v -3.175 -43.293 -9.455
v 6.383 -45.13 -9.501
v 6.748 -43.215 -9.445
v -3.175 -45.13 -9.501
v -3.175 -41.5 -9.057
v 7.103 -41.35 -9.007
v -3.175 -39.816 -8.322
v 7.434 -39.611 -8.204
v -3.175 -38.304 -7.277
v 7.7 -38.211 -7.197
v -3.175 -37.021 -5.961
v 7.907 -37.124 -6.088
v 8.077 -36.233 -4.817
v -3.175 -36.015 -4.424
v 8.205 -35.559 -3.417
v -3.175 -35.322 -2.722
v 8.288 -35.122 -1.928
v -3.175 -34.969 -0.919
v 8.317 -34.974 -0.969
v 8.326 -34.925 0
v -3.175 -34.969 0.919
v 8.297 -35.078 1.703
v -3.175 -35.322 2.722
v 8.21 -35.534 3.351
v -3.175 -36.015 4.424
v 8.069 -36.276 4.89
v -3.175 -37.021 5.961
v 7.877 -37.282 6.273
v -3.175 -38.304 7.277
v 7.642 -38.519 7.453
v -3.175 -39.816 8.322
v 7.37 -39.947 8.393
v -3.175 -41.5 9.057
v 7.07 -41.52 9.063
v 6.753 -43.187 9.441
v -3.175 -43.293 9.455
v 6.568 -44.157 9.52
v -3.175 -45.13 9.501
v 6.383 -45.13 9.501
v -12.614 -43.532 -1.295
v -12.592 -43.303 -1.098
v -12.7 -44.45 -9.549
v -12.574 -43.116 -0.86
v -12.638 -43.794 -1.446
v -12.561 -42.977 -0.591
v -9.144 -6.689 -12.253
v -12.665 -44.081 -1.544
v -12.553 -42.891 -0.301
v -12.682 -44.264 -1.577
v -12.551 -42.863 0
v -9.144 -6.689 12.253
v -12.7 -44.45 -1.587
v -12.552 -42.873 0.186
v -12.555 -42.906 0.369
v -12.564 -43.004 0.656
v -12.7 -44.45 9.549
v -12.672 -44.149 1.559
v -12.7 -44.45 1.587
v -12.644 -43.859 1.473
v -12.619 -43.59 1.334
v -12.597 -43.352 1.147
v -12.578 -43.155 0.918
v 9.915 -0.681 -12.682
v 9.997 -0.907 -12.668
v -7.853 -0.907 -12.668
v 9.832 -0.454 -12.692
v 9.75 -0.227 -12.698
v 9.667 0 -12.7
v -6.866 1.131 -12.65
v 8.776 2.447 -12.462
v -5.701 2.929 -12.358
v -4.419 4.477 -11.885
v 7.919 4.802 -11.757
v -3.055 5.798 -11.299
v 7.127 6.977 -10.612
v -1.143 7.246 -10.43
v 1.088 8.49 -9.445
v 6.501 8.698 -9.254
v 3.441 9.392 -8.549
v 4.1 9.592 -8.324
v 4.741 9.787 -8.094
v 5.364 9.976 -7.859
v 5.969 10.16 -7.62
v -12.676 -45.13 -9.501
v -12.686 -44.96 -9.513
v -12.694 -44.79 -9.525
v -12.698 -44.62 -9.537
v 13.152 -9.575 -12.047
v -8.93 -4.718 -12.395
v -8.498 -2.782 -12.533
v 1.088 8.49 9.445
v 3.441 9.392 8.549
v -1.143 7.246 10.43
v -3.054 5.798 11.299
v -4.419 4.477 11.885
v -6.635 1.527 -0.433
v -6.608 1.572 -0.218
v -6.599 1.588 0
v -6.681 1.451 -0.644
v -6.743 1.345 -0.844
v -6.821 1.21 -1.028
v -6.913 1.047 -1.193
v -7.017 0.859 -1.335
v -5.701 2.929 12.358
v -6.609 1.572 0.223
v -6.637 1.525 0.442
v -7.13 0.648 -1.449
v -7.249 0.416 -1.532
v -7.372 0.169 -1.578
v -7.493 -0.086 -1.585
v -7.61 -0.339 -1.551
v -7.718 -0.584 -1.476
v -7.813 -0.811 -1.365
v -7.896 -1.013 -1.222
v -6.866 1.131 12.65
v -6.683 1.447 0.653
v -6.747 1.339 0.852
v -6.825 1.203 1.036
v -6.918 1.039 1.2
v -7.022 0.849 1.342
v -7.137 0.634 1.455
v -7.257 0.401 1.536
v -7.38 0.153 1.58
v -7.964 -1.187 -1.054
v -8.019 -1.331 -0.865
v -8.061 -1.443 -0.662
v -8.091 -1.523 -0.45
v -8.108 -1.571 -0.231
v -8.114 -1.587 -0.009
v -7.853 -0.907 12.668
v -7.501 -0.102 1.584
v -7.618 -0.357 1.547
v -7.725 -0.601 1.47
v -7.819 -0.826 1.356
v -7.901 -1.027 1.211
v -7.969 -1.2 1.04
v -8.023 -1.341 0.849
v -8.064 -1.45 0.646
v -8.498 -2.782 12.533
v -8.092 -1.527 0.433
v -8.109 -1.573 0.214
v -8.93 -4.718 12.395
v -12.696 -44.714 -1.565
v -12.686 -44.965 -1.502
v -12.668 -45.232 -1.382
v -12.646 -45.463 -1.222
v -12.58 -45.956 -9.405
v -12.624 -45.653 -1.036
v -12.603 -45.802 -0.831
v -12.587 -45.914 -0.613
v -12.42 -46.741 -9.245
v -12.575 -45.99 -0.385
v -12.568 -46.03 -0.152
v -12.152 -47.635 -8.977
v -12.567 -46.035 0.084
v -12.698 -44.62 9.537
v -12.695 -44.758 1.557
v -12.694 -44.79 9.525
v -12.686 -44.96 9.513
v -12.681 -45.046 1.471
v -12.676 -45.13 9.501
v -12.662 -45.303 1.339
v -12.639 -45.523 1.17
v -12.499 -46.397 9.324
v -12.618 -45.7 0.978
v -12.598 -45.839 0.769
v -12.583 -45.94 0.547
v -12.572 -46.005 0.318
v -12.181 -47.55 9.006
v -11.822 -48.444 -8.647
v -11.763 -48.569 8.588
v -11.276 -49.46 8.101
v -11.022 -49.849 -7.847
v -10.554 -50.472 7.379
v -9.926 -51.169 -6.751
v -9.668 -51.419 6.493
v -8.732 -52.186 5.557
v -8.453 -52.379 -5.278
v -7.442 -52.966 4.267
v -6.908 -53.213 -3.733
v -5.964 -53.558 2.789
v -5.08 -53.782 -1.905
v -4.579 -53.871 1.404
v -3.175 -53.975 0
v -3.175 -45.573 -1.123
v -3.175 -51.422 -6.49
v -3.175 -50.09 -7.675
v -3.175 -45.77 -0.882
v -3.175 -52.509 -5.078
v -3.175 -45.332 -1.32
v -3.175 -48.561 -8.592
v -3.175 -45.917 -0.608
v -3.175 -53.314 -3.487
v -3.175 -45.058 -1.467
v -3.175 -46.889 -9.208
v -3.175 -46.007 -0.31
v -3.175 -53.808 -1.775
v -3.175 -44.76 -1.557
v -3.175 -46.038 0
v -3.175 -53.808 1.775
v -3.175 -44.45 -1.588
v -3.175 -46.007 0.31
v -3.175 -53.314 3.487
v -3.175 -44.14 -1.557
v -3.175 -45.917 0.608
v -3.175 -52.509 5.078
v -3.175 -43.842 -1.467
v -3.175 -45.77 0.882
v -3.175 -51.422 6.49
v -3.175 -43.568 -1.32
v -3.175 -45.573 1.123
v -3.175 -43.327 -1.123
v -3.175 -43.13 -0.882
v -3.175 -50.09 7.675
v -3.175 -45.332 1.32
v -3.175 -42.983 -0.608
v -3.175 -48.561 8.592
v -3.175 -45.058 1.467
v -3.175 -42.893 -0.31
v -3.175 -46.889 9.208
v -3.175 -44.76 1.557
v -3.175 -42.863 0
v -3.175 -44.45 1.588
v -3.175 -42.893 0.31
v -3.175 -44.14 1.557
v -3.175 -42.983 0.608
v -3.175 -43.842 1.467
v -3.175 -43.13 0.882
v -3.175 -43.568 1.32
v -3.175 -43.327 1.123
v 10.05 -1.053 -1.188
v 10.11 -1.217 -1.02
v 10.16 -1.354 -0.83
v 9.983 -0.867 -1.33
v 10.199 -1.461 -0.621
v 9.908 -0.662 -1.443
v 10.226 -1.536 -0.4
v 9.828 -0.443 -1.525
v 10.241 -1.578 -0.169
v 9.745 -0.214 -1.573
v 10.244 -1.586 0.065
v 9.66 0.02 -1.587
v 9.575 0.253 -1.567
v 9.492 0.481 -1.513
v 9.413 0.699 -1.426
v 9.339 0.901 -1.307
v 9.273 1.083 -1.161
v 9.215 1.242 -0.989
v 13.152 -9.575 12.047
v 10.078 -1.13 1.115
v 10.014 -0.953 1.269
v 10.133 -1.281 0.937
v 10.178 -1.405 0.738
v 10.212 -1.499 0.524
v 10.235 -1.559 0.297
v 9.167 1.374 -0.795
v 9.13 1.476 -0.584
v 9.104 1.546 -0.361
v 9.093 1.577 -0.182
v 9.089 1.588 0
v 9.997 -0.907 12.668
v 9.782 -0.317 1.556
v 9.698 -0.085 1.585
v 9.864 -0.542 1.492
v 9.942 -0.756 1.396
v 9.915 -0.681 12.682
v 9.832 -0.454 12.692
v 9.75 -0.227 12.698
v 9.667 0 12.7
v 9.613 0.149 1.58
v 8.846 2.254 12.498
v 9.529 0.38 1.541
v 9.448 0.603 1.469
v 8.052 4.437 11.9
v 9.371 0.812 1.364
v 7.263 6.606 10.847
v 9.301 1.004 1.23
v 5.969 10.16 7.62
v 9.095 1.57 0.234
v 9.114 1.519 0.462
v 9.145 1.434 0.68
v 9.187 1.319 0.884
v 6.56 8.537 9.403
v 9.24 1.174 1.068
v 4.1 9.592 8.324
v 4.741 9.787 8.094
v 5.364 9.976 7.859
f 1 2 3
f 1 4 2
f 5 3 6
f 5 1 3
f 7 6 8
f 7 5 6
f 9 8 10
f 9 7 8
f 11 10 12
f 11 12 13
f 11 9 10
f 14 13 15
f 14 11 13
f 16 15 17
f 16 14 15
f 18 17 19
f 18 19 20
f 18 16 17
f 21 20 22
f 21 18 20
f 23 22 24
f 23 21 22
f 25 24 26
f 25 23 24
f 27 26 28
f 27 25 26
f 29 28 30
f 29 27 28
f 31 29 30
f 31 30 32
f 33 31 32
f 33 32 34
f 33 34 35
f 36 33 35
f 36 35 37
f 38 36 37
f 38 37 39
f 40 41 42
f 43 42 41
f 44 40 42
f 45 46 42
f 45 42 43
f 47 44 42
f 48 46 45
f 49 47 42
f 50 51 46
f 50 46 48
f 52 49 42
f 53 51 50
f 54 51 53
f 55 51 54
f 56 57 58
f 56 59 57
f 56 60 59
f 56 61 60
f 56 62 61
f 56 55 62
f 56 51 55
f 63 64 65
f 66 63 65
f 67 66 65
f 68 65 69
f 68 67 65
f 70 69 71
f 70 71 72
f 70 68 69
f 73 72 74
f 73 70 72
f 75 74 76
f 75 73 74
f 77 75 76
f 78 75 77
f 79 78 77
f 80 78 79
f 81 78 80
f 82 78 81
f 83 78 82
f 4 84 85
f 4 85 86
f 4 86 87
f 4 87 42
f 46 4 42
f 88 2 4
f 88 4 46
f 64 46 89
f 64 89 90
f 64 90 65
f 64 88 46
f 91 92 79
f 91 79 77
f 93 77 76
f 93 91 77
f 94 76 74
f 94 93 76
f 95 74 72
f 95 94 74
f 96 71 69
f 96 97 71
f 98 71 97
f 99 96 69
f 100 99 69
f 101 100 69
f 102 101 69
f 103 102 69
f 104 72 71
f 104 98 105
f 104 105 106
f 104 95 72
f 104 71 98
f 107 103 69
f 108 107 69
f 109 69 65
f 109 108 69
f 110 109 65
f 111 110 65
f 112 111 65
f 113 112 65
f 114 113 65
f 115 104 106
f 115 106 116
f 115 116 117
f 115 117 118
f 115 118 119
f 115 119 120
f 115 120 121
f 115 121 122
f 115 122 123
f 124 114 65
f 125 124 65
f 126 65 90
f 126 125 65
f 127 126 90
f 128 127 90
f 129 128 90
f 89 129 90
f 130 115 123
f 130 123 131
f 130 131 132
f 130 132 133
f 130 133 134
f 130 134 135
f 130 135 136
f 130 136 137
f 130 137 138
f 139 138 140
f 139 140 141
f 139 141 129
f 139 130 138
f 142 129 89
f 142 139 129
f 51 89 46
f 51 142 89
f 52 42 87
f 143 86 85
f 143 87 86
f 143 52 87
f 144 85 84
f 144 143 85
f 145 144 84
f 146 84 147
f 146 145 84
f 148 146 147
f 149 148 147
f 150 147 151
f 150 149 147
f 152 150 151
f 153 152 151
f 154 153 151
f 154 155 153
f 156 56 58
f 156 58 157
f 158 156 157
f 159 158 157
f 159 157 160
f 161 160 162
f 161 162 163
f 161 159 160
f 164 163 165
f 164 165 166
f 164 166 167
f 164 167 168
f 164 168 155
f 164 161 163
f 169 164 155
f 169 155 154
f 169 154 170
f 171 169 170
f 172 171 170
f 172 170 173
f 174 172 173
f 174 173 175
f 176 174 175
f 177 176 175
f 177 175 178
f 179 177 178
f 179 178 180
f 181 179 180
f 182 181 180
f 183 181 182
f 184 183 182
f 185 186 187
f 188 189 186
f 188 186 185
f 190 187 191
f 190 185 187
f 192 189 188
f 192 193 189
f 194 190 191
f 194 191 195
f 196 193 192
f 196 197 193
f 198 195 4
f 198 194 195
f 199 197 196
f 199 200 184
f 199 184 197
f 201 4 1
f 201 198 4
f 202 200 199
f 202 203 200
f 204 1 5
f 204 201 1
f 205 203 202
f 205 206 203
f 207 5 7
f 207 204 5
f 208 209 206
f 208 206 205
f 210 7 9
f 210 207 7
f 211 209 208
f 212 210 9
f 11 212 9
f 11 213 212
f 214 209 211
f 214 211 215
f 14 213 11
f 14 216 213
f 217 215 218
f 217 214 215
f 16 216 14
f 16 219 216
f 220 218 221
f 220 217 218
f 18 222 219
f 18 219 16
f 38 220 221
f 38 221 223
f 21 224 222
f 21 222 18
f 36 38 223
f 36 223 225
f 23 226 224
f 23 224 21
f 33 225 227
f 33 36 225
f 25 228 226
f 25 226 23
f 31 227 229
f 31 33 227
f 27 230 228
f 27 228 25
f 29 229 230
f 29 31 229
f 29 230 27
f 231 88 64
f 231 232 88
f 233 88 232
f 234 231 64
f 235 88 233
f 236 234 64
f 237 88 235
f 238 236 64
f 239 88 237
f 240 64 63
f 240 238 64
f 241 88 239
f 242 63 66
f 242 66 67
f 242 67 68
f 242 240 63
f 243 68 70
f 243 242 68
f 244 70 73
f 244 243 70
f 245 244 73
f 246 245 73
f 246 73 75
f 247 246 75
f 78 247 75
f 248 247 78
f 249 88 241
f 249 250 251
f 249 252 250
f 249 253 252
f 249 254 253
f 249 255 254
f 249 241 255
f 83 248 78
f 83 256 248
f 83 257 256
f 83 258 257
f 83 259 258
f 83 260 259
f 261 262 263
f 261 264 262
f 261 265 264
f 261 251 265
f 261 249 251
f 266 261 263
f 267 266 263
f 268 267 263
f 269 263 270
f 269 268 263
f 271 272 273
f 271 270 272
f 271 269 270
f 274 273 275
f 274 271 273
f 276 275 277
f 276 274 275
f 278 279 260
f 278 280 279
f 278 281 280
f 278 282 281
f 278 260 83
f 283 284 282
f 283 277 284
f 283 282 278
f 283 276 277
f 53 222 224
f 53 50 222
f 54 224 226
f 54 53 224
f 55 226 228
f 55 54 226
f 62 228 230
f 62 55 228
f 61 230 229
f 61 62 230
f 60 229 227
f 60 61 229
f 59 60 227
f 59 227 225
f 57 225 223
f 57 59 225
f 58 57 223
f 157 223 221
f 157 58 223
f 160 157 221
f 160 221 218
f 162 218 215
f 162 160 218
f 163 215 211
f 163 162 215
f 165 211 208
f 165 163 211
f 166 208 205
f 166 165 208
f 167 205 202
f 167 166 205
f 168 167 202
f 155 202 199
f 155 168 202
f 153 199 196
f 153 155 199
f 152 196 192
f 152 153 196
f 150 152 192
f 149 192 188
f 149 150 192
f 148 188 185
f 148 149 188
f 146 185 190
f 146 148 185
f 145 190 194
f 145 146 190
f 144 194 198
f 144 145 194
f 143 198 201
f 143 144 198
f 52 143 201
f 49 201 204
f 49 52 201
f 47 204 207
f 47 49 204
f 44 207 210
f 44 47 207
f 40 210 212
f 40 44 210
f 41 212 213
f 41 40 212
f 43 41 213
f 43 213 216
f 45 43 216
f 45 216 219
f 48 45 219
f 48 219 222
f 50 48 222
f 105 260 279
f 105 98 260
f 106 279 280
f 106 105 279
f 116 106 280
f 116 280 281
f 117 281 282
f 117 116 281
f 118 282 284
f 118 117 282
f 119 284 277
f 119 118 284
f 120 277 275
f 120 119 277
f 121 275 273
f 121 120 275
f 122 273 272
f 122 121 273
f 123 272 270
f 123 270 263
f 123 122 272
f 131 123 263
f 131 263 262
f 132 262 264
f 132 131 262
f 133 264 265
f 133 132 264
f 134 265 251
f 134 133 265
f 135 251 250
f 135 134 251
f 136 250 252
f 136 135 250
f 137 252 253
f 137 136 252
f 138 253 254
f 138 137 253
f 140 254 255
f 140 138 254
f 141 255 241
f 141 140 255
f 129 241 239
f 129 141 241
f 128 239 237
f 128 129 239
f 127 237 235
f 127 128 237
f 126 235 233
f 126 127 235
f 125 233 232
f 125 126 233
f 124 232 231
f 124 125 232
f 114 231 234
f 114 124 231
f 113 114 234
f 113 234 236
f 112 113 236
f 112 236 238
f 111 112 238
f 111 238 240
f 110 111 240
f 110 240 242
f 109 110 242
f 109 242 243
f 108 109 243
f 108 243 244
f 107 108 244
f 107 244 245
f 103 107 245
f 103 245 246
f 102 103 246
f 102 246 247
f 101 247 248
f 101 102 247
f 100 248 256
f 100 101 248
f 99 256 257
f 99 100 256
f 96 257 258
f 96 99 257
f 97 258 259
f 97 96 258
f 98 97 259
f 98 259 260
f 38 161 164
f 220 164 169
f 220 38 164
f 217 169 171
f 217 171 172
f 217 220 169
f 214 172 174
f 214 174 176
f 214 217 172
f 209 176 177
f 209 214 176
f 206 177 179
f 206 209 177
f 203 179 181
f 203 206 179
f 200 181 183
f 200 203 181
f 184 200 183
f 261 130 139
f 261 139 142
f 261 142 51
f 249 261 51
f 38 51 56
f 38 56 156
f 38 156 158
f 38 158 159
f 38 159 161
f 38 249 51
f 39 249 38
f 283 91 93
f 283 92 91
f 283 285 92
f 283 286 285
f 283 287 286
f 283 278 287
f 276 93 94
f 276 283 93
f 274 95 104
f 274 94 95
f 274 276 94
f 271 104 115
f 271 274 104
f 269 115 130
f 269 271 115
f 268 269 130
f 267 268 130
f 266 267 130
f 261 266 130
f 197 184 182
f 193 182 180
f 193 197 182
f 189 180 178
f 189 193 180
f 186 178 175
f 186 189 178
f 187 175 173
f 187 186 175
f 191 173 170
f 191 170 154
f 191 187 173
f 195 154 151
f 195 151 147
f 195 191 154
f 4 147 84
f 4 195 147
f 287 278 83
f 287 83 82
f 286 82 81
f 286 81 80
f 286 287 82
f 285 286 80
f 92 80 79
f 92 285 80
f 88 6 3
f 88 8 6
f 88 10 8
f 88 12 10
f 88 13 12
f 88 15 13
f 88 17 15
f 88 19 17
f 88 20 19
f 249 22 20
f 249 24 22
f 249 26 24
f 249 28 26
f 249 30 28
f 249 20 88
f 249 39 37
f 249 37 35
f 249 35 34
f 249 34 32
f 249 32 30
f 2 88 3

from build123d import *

# Parameters (mm, degrees)
F1_R     = 1.5875
F2_DEPTH = 25.4
F3_DEPTH = 12.7
F5_R     = 9.525
F5_R_2   = 1.5875
F6_DEPTH = 25.4


with BuildPart() as f2:
    # F1 (on Right) → F2 (new body, symmetric)
    with BuildSketch(Plane.YZ):
        with BuildLine():
            Line((-45.1303571429, -9.5006704583), (-0.9071428571, -12.6675606111))
            ThreePointArc((-0.9071428571, -12.6675606111), (12.7, 0), (-0.9071428571, 12.6675606111))
            Line((-0.9071428571, 12.6675606111), (-45.1303571429, 9.5006704583))
            ThreePointArc((-45.1303571429, 9.5006704583), (-53.975, 0), (-45.1303571429, -9.5006704583))
        make_face()
        with Locations((-44.45, 0)):
            Circle(F1_R, mode=Mode.SUBTRACT)
        Circle(F1_R, mode=Mode.SUBTRACT)
    extrude(amount=F2_DEPTH, both=True)

    # F0 (on Top) → F3 (intersect, symmetric)
    with BuildSketch(Plane.XY):
        with BuildLine():
            Line((6.0986519691, -46.6237074677), (13.1521007809, -9.5754071973))
            Line((13.1521007809, -9.5754071973), (5.969, 10.16))
            Line((5.969, 10.16), (3.4413070321, 9.3918339606))
            ThreePointArc((3.4413070321, 9.3918339606), (-2.998086321, 5.846793894), (-7.4532066327, 0))
            ThreePointArc((-7.4532066327, 0), (-8.6264344272, -3.2618802949), (-9.1444445756, -6.6894146861))
            Line((-9.1444445756, -6.6894146861), (-12.7, -44.45))
            ThreePointArc((-12.7, -44.45), (-4.2690955154, -53.9119543437), (6.0986519691, -46.6237074677))
        make_face()
    extrude(amount=F3_DEPTH, both=True, mode=Mode.INTERSECT)

    # F5 (on offset) → F6 (cut)
    with BuildSketch(Plane.YZ.offset(-3.175)):
        with Locations((-44.45, 0)):
            Circle(F5_R)
        with Locations((-44.45, 0)):
            Circle(F5_R_2, mode=Mode.SUBTRACT)
    extrude(amount=F6_DEPTH, mode=Mode.SUBTRACT)


solid = f2.part
